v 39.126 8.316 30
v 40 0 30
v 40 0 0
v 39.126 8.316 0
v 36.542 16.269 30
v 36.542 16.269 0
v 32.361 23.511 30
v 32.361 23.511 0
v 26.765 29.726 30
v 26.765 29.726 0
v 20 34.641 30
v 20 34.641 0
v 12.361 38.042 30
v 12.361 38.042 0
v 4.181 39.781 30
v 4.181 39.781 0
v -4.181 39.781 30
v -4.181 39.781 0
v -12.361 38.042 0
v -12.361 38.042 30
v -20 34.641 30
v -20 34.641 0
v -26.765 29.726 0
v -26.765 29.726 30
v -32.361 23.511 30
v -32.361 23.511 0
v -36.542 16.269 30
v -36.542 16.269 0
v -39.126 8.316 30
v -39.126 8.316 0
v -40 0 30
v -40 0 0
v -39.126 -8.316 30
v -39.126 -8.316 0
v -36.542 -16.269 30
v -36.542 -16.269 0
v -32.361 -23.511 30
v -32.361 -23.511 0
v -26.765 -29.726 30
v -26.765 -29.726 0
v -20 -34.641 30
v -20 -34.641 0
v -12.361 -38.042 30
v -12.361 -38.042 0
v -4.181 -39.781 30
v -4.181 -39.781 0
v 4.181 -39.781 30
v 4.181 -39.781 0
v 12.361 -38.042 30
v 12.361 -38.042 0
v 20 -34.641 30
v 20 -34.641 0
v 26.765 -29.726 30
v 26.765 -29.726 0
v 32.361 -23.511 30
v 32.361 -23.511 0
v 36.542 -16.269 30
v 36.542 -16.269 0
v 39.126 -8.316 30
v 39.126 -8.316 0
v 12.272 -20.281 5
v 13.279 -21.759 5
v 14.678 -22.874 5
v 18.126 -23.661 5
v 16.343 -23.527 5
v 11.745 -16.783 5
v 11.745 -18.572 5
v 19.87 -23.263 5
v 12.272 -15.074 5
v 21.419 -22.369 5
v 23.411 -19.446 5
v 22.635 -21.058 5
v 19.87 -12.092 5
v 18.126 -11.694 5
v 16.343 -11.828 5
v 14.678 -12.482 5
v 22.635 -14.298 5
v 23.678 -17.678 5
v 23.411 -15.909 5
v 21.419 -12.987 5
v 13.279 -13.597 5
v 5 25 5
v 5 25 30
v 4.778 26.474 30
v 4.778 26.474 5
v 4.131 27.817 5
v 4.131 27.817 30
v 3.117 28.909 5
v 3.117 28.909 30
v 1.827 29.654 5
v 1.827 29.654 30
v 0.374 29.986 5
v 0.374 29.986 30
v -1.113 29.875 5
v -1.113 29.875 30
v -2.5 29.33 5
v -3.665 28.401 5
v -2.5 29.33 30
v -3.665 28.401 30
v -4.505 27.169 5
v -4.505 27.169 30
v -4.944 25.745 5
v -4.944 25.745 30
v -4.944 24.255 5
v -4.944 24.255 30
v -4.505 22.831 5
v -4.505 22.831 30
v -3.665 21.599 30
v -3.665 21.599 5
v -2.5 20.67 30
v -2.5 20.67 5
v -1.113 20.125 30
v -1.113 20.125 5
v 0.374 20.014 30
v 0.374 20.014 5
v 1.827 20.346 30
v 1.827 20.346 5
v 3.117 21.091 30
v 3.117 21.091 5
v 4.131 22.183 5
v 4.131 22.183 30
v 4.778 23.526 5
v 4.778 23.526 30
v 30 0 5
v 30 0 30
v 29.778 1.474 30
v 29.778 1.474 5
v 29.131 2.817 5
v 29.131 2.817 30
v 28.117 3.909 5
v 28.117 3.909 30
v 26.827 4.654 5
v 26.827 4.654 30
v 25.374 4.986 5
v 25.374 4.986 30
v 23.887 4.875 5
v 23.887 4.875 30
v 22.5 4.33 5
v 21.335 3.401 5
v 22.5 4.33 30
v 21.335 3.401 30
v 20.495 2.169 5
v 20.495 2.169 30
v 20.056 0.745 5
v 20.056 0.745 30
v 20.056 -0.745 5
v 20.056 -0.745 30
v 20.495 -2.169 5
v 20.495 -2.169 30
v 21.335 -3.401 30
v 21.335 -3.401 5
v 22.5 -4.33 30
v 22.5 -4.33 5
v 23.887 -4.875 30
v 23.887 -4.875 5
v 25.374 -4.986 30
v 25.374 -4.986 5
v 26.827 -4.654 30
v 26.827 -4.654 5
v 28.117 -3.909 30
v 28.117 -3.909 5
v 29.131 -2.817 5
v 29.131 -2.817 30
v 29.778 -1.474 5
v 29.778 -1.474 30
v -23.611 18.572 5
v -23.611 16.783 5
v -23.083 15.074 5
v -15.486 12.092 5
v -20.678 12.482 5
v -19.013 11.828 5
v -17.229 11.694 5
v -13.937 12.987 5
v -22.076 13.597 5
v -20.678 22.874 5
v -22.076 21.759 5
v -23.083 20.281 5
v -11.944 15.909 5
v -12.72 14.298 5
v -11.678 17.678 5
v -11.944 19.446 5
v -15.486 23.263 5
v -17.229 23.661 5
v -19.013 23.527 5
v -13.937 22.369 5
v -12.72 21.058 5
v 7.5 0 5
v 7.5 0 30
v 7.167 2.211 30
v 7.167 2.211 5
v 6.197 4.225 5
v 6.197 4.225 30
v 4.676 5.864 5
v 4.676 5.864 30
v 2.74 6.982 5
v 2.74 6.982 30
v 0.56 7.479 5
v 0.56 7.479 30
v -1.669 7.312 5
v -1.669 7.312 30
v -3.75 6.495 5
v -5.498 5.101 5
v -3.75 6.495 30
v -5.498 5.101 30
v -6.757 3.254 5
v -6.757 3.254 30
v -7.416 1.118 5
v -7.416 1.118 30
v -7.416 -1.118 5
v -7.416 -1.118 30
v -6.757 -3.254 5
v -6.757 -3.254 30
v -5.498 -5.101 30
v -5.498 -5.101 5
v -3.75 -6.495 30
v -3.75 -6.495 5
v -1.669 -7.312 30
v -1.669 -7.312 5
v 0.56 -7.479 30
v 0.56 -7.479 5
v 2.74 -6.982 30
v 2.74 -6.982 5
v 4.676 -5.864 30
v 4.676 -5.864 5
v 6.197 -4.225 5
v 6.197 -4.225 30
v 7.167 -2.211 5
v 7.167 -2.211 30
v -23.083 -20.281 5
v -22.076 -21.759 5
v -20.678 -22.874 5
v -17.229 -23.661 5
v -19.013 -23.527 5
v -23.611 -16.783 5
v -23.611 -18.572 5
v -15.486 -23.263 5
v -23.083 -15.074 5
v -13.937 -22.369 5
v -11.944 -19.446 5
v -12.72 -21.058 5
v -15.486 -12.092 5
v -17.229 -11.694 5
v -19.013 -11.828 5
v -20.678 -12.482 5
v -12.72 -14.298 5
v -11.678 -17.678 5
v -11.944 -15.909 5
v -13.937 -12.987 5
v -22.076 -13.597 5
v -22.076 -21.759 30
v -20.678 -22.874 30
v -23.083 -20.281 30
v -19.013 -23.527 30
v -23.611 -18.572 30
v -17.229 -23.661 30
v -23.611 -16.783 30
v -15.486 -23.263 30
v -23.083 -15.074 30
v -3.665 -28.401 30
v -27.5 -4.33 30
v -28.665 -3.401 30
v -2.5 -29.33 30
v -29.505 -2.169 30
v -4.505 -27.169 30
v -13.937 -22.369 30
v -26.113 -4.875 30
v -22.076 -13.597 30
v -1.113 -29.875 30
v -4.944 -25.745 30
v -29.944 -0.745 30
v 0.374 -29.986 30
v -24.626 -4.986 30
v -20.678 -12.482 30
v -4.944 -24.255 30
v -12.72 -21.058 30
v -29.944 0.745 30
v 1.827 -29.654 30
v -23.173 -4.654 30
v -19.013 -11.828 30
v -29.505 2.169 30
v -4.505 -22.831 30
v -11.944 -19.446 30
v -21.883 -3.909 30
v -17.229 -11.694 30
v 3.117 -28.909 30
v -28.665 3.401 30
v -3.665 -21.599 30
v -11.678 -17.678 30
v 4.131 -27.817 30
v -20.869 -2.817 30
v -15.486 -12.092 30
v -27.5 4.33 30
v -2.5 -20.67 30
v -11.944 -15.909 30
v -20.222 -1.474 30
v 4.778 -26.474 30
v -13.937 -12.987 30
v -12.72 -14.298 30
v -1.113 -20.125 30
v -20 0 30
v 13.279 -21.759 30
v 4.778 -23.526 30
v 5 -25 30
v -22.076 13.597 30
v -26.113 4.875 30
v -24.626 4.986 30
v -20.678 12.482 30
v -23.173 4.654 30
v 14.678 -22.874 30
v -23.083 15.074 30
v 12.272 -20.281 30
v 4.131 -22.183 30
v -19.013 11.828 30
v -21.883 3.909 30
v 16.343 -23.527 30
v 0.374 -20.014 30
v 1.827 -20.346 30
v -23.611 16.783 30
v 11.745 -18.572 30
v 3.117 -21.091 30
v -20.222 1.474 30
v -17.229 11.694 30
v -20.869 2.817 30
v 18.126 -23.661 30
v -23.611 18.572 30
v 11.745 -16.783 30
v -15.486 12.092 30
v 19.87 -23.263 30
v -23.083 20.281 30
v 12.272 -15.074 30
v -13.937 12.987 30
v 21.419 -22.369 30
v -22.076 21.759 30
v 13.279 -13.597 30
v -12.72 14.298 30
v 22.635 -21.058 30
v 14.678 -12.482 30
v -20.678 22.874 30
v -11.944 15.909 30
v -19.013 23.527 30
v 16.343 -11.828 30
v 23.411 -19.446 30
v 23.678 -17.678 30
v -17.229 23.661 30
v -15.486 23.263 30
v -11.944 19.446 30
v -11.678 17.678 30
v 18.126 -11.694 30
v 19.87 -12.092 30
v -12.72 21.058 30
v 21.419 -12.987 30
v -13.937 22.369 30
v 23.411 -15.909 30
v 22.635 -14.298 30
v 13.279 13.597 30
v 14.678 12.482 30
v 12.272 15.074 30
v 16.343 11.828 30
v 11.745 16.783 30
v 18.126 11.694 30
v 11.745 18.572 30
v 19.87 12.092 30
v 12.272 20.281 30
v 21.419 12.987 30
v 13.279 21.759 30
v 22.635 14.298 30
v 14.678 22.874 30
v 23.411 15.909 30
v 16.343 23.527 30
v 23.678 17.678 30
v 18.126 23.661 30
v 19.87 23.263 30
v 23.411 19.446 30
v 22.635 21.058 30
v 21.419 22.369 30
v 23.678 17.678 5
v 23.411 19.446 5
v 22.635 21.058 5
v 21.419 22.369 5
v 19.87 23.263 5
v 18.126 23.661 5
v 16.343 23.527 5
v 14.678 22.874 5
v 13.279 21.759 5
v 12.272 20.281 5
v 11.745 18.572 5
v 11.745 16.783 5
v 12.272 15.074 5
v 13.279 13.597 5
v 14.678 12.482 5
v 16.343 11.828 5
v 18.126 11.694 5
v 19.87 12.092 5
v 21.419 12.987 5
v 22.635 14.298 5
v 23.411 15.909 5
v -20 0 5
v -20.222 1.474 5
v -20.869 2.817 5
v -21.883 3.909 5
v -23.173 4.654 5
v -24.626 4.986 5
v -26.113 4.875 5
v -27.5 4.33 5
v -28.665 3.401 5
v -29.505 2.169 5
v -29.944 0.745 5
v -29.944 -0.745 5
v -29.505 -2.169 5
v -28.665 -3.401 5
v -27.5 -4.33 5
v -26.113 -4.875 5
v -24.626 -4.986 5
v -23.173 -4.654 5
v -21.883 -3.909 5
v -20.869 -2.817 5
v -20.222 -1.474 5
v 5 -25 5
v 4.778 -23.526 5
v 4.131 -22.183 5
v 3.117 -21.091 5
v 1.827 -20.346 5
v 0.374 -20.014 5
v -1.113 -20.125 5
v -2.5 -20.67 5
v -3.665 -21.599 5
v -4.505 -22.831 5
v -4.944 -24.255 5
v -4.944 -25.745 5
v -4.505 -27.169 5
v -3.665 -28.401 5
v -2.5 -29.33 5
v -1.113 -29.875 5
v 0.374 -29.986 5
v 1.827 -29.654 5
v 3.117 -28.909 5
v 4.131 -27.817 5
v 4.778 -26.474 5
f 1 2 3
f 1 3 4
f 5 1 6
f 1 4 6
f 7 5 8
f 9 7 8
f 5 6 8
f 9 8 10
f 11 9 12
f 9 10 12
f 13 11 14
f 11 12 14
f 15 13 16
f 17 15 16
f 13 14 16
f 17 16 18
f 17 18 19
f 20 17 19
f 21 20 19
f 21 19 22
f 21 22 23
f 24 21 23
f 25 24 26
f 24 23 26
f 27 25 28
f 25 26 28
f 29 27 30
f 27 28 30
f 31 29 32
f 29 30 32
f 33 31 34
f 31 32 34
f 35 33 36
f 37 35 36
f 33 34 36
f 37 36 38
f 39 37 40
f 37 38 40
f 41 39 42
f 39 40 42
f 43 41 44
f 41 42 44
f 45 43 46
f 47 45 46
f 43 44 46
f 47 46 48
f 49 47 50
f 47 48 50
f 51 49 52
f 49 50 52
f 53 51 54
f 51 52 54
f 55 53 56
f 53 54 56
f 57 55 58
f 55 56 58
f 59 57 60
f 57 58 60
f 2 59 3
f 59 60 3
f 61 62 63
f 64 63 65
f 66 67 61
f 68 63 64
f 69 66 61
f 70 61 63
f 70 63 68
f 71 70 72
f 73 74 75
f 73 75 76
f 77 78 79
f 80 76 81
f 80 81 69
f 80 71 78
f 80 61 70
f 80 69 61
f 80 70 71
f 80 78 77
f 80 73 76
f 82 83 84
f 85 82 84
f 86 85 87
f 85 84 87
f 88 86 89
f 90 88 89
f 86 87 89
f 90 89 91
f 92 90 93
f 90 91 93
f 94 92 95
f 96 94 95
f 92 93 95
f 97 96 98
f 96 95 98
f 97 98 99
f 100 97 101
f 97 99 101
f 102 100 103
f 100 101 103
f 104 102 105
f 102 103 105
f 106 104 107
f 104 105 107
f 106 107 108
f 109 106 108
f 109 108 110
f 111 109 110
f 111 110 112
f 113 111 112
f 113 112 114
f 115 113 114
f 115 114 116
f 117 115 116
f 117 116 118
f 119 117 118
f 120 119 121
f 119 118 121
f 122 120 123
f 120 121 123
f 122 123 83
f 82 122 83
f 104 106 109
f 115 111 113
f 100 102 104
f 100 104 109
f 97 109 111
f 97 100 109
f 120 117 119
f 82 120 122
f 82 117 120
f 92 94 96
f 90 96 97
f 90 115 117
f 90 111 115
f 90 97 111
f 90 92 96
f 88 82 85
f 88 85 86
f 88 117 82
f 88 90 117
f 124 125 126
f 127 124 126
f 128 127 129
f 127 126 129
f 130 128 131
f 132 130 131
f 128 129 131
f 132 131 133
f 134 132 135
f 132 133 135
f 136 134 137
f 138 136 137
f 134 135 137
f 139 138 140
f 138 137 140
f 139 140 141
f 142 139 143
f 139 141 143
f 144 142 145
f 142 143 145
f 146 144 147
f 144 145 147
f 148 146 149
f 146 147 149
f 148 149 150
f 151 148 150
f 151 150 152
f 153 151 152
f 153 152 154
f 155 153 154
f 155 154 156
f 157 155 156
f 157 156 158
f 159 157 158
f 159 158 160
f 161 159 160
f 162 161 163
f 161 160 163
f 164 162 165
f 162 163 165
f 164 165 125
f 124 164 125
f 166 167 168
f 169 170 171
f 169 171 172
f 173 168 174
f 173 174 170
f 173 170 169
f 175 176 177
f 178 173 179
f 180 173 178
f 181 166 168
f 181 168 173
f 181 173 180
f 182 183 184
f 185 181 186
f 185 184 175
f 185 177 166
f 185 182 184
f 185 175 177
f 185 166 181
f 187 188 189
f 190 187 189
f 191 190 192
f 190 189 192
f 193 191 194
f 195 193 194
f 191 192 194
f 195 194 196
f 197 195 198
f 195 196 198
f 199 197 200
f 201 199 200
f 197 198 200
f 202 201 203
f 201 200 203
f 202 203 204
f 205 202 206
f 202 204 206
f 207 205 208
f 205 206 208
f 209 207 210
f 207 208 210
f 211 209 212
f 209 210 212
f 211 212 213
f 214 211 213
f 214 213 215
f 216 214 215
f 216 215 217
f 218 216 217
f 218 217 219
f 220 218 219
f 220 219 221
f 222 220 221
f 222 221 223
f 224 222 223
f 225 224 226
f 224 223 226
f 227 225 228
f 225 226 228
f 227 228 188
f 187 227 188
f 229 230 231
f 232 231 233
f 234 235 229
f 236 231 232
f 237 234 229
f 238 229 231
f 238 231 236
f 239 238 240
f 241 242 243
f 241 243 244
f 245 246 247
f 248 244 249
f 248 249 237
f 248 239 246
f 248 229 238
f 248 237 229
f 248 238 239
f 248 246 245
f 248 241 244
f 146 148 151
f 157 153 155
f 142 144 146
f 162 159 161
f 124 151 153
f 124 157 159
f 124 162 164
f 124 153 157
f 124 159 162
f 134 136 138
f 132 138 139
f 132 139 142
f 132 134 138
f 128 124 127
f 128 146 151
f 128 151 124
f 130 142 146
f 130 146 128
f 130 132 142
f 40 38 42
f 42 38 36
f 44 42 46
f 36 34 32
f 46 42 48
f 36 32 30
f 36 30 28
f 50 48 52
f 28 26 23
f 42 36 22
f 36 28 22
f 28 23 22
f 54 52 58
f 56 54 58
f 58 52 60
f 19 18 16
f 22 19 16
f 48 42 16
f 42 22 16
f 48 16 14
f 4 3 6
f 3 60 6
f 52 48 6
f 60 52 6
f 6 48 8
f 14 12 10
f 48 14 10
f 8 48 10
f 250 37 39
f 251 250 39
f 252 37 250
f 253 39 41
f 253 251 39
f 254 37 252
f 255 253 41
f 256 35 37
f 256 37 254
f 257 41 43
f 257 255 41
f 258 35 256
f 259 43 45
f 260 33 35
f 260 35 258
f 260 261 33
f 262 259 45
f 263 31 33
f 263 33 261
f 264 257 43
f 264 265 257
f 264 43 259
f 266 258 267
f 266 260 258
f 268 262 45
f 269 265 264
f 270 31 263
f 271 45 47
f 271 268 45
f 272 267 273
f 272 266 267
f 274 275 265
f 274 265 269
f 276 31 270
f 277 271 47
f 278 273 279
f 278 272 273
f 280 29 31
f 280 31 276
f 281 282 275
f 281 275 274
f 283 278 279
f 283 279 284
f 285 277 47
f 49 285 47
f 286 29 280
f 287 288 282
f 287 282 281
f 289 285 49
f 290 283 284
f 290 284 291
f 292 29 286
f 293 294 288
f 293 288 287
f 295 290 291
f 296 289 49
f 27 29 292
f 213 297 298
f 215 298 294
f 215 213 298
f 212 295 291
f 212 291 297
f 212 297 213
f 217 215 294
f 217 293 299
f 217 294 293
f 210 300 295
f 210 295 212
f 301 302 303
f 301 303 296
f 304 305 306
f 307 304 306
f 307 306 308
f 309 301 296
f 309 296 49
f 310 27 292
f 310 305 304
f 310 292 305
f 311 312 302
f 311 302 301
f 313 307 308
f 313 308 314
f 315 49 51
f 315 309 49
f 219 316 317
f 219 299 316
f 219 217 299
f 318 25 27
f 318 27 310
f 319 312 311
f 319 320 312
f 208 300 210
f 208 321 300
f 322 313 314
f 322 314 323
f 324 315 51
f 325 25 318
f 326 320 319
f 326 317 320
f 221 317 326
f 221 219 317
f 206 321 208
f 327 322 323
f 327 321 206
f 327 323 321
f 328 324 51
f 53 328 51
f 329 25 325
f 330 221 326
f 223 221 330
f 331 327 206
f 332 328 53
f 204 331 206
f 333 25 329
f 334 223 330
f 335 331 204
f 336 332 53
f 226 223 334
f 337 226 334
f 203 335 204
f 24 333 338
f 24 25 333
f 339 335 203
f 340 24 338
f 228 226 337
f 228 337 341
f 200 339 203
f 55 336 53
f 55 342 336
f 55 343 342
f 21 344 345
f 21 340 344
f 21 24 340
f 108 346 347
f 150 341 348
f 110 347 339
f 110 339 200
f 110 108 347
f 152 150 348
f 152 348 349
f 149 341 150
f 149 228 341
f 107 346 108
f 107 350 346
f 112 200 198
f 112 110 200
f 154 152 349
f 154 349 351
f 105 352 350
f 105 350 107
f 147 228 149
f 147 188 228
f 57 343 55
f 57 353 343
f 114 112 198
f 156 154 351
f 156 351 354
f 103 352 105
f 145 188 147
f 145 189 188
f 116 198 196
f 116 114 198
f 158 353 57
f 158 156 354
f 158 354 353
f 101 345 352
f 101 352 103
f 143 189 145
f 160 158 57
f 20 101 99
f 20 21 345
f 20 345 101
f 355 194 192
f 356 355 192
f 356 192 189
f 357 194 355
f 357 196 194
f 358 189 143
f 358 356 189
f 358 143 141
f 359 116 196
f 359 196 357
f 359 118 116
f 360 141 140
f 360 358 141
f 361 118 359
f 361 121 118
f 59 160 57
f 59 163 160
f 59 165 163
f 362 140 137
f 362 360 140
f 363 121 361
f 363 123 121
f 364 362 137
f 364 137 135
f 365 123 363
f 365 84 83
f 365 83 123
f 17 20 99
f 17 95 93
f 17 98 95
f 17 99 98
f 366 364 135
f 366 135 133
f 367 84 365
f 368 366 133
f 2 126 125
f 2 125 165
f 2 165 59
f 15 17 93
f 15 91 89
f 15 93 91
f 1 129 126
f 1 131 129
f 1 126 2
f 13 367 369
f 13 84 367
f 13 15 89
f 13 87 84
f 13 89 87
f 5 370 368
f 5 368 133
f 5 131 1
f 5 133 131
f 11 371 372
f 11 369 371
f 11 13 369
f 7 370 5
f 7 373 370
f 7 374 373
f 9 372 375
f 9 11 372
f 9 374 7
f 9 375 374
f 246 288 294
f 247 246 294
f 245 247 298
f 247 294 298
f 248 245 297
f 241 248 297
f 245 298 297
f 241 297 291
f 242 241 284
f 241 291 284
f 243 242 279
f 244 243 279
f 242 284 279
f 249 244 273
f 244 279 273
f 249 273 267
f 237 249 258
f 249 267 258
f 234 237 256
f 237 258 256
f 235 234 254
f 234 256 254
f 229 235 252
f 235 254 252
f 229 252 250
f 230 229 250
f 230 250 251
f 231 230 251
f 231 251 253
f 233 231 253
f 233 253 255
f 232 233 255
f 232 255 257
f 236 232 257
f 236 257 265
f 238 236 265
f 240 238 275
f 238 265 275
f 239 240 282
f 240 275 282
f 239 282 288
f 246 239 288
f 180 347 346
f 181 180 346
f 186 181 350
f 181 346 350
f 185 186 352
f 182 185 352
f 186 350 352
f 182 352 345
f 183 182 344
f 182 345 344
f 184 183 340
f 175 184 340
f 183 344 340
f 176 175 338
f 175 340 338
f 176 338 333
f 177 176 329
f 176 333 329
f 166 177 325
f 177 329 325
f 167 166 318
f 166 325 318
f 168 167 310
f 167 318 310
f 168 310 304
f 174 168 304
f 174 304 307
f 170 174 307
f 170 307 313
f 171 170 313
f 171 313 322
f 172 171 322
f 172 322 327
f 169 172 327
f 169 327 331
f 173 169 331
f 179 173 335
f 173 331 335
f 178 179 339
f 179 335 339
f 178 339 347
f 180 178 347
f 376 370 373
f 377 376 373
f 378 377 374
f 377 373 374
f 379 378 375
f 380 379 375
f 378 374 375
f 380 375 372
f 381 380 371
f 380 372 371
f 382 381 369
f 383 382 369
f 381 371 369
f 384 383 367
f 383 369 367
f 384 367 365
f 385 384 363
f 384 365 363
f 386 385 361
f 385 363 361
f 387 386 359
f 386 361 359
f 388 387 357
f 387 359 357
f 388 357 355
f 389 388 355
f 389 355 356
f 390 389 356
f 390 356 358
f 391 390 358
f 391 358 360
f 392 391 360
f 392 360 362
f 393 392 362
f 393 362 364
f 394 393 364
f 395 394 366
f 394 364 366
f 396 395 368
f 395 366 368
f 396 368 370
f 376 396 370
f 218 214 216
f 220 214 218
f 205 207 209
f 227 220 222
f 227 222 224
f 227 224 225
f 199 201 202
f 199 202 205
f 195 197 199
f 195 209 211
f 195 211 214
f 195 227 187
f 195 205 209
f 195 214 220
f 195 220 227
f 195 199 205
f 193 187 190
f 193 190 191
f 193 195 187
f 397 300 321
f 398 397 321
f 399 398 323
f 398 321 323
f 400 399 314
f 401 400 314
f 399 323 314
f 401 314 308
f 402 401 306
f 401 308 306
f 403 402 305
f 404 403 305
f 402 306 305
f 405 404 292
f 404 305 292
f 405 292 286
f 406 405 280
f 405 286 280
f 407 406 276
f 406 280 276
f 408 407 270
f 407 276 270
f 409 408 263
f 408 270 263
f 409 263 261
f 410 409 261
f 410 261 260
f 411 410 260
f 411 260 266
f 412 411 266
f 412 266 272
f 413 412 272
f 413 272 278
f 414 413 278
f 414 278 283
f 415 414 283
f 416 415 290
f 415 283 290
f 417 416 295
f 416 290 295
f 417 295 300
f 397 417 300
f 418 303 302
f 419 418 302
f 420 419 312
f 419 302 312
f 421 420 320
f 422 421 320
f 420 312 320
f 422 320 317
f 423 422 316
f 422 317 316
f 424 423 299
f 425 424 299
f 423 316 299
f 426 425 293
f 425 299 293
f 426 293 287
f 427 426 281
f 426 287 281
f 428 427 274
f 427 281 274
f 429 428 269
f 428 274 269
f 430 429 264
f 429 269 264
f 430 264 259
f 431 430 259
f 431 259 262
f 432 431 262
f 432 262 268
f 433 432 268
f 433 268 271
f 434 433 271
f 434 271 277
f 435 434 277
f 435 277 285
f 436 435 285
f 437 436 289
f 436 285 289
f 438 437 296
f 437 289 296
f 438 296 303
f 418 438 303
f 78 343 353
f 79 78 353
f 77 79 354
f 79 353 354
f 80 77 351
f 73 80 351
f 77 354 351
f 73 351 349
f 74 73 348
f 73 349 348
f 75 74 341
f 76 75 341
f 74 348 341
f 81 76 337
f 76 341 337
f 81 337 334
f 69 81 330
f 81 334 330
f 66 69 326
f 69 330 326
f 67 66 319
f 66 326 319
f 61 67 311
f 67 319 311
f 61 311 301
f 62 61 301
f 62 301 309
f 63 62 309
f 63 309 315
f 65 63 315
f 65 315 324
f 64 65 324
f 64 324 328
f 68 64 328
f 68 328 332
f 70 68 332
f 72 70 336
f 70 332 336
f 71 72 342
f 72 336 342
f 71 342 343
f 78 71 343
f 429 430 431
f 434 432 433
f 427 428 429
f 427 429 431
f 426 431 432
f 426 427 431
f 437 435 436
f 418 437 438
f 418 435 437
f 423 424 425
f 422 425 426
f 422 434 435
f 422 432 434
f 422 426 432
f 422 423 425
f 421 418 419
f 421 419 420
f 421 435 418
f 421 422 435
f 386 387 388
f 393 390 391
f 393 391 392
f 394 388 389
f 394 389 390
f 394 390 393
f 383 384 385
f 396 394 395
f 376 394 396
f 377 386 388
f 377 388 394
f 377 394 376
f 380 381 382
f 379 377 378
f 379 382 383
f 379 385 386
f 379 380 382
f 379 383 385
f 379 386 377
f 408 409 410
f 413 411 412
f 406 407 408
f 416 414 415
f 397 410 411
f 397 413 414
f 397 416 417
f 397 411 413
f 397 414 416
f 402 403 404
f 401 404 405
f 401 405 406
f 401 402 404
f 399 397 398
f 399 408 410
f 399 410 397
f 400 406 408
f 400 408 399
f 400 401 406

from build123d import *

# Parameters (mm, degrees)
SKIZZE1_R                       = 40
AUFSATZ_LINEAR_AUSTRAGEN1_DEPTH = 30
SKIZZE2_R                       = 5
SCHNITT_LINEAR_AUSTRAGEN1_DEPTH = 25
SKIZZE4_R                       = 6
SCHNITT_LINEAR_AUSTRAGEN5_DEPTH = 25
SKIZZE5_R                       = 7.5
SCHNITT_LINEAR_AUSTRAGEN6_DEPTH = 25


with BuildPart() as part:
    # Skizze1 → Aufsatz-Linear austragen1 (new body)
    with BuildSketch(Plane.XY):
        Circle(SKIZZE1_R)
    extrude(amount=AUFSATZ_LINEAR_AUSTRAGEN1_DEPTH)

    # Skizze2 → Schnitt-Linear austragen1 (cut)
    with BuildSketch(Plane.XY.offset(30)):
        with Locations((25, 0)):
            Circle(SKIZZE2_R)
        with Locations((0, -25)):
            Circle(SKIZZE2_R)
        with Locations((-25, 0)):
            Circle(SKIZZE2_R)
        with Locations((0, 25)):
            Circle(SKIZZE2_R)
    extrude(amount=-SCHNITT_LINEAR_AUSTRAGEN1_DEPTH, mode=Mode.SUBTRACT)

    # Skizze4 → Schnitt-Linear austragen5 (cut)
    with BuildSketch(Plane.XY.offset(30)):
        with Locations((17.67766953, 17.67766953)):
            Circle(SKIZZE4_R)
        with Locations((17.67766953, -17.67766953)):
            Circle(SKIZZE4_R)
        with Locations((-17.67766953, -17.67766953)):
            Circle(SKIZZE4_R)
        with Locations((-17.67766953, 17.67766953)):
            Circle(SKIZZE4_R)
    extrude(amount=-SCHNITT_LINEAR_AUSTRAGEN5_DEPTH, mode=Mode.SUBTRACT)

    # Skizze5 → Schnitt-Linear austragen6 (cut)
    with BuildSketch(Plane.XY.offset(30)):
        Circle(SKIZZE5_R)
    extrude(amount=-SCHNITT_LINEAR_AUSTRAGEN6_DEPTH, mode=Mode.SUBTRACT)


solid = part.part
